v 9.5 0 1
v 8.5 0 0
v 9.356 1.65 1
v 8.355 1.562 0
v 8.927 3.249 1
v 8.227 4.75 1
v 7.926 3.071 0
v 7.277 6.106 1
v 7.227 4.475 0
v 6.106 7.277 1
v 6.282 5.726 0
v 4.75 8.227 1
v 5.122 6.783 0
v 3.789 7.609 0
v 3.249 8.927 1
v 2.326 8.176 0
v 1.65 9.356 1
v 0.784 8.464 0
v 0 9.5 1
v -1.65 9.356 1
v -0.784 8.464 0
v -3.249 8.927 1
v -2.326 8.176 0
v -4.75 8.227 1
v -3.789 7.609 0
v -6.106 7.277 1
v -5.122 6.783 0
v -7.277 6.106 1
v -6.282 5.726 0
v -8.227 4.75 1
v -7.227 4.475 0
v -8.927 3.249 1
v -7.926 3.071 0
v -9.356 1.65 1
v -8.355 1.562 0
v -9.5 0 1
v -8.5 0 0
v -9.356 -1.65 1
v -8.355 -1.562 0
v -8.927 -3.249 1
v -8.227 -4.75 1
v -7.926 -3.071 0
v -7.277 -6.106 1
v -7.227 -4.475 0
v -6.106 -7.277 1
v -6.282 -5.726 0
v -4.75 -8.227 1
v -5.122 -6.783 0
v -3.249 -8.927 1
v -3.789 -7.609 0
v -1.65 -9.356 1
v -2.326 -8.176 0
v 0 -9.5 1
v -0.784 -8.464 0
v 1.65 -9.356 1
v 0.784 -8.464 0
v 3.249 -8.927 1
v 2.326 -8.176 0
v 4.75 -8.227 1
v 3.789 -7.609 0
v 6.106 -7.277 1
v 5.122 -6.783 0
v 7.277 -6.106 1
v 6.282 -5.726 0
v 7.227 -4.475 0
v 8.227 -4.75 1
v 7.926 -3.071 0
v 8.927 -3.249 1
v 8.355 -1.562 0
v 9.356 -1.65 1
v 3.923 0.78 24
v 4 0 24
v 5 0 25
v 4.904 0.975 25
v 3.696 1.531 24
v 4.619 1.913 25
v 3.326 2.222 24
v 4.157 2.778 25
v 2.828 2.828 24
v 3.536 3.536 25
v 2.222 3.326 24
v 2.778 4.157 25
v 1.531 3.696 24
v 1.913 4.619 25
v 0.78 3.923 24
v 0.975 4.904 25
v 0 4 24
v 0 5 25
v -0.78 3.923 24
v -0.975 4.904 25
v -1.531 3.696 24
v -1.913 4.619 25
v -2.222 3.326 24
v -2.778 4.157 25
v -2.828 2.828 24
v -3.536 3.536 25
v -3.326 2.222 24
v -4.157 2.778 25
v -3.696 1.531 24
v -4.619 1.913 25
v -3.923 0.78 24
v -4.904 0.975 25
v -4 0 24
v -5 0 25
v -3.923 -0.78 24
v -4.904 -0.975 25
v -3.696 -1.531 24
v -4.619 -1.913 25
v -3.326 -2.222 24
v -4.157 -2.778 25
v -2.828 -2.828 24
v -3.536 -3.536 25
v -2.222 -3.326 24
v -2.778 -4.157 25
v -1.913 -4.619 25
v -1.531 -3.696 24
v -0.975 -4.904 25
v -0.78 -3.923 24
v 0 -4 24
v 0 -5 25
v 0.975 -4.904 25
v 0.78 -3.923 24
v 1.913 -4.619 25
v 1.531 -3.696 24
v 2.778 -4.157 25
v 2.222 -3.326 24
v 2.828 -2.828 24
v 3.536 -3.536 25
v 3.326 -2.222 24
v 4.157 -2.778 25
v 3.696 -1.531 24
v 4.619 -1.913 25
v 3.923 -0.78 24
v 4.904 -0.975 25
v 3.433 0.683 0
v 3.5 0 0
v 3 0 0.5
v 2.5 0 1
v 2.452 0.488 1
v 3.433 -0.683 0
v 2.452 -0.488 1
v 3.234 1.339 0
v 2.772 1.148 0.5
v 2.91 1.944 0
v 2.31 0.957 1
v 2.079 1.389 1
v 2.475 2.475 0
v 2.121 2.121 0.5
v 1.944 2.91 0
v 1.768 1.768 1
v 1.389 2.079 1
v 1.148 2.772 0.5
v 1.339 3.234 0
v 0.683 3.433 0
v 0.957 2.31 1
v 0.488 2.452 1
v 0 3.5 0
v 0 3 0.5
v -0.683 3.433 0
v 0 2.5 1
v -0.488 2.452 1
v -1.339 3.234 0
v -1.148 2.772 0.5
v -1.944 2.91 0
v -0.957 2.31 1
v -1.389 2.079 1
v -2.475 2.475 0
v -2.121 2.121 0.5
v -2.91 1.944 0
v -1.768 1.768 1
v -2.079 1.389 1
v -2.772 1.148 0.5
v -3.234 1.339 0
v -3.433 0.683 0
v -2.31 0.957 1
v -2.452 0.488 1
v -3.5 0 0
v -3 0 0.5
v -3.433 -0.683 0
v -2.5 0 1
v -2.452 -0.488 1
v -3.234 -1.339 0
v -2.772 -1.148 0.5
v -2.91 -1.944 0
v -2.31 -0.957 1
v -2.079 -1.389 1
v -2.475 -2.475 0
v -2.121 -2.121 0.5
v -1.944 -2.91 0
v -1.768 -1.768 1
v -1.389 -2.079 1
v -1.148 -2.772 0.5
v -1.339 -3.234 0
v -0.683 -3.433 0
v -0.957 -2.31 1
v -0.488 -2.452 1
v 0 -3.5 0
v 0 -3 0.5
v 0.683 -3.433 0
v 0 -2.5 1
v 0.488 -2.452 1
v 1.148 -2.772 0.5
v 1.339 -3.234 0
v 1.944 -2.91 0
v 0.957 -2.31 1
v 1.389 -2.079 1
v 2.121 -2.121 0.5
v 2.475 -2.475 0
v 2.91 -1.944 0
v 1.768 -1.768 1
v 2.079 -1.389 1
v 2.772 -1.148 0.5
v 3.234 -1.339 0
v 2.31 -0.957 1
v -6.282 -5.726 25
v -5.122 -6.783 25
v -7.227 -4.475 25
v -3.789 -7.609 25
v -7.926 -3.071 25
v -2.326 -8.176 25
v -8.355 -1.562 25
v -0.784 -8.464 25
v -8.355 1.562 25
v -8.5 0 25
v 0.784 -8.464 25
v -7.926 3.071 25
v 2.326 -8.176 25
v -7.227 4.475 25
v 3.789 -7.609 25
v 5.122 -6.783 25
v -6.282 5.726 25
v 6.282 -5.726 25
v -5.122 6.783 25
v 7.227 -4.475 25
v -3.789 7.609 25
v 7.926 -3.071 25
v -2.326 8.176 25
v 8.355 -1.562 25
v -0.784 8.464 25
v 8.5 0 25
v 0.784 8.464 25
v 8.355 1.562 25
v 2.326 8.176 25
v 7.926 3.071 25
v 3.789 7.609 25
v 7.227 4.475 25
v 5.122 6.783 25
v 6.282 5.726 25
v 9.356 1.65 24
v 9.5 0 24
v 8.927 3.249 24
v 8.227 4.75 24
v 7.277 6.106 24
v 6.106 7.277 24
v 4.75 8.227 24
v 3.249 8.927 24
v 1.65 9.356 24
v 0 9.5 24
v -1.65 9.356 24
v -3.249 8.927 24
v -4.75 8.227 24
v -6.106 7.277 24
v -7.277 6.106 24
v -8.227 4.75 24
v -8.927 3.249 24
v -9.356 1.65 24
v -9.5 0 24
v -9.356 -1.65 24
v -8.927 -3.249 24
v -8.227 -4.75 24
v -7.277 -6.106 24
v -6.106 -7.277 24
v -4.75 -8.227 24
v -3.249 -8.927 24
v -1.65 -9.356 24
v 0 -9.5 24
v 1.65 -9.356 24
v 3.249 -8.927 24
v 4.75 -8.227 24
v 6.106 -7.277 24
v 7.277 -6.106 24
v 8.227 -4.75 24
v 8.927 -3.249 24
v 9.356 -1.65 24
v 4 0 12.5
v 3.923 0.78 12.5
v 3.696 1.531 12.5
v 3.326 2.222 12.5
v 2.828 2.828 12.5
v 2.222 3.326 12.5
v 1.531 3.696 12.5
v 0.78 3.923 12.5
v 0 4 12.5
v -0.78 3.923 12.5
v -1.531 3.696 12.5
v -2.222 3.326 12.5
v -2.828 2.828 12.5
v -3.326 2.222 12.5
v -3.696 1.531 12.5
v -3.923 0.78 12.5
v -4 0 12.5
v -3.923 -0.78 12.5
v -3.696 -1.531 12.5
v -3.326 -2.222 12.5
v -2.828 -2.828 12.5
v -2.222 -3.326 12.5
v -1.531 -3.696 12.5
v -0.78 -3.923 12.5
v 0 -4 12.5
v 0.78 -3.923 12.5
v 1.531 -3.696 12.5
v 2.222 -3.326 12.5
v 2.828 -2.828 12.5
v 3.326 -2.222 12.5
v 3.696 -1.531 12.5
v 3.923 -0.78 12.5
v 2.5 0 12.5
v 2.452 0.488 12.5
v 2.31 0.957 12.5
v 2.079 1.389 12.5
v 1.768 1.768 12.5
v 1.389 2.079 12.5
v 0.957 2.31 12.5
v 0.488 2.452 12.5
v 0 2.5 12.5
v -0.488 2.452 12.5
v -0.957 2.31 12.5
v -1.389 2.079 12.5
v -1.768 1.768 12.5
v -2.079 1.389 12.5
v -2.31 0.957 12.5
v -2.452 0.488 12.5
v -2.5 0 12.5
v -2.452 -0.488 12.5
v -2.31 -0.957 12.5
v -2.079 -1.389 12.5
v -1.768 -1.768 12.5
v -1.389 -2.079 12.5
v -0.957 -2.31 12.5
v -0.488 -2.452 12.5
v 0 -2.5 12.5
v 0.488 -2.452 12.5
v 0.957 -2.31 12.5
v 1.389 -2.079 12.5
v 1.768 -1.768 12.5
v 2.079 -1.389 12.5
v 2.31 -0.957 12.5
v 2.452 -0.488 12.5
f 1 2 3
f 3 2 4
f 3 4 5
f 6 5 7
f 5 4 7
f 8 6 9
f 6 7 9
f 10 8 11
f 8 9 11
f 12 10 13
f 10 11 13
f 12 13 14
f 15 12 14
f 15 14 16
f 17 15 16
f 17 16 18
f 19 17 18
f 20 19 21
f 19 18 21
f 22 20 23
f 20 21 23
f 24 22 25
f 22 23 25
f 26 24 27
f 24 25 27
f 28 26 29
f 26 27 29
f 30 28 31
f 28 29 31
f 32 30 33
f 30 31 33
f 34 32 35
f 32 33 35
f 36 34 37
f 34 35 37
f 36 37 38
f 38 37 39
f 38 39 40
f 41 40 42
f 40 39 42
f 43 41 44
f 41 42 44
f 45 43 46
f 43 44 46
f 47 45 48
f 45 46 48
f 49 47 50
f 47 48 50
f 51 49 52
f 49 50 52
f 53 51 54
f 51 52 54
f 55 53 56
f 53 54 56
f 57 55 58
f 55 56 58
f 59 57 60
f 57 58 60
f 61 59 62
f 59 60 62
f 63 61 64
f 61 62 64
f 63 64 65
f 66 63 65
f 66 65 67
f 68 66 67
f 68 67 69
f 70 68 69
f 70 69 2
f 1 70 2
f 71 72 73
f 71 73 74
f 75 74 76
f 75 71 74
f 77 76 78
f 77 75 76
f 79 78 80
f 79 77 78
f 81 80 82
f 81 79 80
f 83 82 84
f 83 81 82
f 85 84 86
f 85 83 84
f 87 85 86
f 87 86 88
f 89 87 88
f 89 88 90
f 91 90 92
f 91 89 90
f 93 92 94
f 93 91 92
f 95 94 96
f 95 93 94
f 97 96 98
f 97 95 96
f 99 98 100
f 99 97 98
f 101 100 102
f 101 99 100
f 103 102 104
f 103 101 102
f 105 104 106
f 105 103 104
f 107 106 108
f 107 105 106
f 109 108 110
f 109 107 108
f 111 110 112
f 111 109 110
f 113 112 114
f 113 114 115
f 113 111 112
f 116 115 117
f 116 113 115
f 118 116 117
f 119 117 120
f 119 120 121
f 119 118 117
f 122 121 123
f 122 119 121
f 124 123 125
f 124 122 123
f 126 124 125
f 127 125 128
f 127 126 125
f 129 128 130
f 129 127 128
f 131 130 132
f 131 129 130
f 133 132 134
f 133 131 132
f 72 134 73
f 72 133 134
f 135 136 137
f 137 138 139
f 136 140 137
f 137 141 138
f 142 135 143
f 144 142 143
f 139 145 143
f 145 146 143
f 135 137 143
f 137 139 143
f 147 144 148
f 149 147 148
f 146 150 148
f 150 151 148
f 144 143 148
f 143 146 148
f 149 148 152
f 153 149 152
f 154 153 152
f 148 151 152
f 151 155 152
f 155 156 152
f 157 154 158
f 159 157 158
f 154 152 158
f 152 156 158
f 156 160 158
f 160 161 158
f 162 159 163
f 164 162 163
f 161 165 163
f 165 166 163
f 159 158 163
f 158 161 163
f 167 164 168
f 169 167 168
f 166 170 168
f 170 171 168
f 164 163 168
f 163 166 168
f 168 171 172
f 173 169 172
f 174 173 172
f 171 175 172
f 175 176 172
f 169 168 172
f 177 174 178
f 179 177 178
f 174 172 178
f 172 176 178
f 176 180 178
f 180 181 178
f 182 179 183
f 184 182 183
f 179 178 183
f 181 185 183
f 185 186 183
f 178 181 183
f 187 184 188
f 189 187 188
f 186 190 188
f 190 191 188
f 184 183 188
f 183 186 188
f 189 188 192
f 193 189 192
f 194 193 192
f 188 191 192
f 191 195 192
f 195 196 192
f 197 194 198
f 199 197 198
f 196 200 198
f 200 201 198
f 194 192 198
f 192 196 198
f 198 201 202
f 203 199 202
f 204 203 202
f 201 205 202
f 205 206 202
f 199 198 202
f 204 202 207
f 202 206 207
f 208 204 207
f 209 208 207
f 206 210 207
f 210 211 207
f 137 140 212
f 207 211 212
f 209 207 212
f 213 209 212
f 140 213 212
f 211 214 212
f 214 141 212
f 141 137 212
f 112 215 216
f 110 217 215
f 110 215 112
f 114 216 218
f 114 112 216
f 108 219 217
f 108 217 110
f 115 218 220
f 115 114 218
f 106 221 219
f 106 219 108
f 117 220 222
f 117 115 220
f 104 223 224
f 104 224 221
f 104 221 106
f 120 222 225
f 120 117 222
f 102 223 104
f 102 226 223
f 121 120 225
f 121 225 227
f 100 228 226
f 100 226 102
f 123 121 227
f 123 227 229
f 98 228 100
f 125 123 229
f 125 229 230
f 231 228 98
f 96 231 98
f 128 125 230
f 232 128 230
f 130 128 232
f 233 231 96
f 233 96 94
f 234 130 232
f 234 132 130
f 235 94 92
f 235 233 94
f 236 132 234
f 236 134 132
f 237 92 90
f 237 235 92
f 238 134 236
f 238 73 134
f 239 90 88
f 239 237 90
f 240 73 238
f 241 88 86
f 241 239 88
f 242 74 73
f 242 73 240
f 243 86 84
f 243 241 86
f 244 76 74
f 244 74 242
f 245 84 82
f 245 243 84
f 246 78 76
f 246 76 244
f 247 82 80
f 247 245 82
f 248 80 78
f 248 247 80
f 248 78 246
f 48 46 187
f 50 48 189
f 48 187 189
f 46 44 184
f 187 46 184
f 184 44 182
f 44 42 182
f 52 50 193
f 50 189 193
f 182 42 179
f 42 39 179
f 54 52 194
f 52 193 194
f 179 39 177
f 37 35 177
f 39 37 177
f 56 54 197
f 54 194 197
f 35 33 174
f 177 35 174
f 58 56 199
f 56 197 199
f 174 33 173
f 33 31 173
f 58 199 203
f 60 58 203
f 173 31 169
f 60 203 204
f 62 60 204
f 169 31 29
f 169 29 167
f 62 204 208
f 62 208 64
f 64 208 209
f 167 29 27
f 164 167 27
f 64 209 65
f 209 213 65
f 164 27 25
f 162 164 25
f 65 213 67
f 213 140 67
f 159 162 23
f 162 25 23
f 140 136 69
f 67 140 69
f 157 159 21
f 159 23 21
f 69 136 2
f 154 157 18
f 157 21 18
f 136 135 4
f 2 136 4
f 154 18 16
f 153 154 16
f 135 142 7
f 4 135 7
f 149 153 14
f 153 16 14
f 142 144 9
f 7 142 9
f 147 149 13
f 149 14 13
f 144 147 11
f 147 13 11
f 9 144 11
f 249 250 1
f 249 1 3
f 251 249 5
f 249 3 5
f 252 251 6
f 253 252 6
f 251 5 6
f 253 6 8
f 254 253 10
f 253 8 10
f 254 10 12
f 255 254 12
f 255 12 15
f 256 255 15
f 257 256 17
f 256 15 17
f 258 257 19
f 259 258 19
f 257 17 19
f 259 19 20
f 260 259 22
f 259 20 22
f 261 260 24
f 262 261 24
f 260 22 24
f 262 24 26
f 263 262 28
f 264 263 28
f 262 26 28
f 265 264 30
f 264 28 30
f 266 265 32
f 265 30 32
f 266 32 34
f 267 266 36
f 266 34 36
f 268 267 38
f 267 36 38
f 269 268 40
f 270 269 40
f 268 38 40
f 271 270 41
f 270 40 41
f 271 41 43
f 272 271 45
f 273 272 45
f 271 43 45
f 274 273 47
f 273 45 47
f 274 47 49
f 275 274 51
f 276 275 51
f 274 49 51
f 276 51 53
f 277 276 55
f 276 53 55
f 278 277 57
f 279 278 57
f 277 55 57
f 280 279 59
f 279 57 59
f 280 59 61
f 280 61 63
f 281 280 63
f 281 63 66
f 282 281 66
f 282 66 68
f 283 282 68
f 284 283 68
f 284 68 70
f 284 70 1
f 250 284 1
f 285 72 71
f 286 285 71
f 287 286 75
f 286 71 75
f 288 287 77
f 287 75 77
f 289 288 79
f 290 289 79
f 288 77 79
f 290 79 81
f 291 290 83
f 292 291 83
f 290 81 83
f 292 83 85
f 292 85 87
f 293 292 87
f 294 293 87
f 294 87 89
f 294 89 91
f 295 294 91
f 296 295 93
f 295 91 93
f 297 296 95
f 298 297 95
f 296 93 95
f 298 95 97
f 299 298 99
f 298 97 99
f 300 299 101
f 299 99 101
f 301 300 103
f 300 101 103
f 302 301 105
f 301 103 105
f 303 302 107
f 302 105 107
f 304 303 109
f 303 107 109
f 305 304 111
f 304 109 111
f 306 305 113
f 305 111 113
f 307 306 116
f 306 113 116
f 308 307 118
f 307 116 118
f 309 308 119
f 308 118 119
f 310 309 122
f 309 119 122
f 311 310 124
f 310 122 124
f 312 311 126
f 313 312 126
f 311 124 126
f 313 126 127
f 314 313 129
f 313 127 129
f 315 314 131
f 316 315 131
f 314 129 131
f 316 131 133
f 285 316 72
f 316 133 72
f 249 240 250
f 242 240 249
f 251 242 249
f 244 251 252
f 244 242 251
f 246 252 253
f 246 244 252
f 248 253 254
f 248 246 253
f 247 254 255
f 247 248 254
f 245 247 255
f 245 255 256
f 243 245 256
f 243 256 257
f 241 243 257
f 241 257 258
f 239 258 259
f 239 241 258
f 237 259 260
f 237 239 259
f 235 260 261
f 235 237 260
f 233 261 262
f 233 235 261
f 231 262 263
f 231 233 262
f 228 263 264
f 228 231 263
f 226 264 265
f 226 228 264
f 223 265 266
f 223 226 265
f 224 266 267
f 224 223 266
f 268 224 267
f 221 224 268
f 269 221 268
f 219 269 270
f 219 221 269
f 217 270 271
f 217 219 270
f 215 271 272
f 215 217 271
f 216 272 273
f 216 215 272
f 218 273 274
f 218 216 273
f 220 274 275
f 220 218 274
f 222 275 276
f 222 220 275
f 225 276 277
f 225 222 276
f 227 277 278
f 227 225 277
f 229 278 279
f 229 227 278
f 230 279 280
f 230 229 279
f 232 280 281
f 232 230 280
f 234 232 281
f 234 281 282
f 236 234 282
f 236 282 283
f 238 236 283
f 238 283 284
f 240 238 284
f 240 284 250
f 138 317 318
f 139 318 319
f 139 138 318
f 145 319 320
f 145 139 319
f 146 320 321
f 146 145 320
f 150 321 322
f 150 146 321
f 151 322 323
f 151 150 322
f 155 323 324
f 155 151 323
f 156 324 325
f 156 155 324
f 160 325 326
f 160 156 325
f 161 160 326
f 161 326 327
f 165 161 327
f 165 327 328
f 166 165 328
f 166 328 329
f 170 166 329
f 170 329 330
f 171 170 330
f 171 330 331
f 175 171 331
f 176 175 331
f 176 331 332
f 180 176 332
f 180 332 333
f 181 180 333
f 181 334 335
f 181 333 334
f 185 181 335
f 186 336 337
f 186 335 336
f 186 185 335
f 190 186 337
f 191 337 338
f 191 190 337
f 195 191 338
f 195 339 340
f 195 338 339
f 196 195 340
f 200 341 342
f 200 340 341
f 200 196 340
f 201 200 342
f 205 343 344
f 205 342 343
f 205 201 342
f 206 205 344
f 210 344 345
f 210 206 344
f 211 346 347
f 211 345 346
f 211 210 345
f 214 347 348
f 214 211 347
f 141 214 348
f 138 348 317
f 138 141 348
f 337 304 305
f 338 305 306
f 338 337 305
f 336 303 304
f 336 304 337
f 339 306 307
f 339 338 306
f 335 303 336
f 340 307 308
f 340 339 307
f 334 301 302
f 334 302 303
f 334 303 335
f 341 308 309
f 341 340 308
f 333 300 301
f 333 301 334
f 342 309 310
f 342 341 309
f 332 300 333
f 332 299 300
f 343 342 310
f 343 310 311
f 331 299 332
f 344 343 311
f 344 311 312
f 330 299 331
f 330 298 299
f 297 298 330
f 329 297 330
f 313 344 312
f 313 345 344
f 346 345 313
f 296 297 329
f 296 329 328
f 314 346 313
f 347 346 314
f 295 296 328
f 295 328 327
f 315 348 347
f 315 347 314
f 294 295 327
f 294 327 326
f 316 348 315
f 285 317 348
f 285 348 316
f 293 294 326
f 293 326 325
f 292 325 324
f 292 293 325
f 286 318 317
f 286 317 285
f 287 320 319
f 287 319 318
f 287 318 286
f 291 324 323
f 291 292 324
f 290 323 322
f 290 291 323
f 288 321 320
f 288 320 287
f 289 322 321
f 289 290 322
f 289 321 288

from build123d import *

# Parameters (mm, degrees)
SKETCH_R     = 9.5
SKETCH_R_2   = 2.5
PAD_DEPTH    = 25
SKETCH001_R  = 4
POCKET_DEPTH = 12.5
CHAMFER_SIZE = 1


with BuildPart() as part:
    # Sketch → Pad (new body)
    with BuildSketch(Plane.XY):
        Circle(SKETCH_R)
        Circle(SKETCH_R_2, mode=Mode.SUBTRACT)
    extrude(amount=PAD_DEPTH)

    # Sketch001 (on Face4 of Pad) → Pocket (cut)
    with BuildSketch(Plane.XY.offset(25)):
        Circle(SKETCH001_R)
    extrude(amount=-POCKET_DEPTH, mode=Mode.SUBTRACT)

    # Chamfer
    chamfer_edges = [part.edges().sort_by_distance(p)[0] for p in [
        (-9.5, 0, 25),
        (-4, 0, 25),
        (-9.5, 0, 0),
        (-2.5, 0, 0),
    ]]
    chamfer(chamfer_edges, length=CHAMFER_SIZE)


solid = part.part
